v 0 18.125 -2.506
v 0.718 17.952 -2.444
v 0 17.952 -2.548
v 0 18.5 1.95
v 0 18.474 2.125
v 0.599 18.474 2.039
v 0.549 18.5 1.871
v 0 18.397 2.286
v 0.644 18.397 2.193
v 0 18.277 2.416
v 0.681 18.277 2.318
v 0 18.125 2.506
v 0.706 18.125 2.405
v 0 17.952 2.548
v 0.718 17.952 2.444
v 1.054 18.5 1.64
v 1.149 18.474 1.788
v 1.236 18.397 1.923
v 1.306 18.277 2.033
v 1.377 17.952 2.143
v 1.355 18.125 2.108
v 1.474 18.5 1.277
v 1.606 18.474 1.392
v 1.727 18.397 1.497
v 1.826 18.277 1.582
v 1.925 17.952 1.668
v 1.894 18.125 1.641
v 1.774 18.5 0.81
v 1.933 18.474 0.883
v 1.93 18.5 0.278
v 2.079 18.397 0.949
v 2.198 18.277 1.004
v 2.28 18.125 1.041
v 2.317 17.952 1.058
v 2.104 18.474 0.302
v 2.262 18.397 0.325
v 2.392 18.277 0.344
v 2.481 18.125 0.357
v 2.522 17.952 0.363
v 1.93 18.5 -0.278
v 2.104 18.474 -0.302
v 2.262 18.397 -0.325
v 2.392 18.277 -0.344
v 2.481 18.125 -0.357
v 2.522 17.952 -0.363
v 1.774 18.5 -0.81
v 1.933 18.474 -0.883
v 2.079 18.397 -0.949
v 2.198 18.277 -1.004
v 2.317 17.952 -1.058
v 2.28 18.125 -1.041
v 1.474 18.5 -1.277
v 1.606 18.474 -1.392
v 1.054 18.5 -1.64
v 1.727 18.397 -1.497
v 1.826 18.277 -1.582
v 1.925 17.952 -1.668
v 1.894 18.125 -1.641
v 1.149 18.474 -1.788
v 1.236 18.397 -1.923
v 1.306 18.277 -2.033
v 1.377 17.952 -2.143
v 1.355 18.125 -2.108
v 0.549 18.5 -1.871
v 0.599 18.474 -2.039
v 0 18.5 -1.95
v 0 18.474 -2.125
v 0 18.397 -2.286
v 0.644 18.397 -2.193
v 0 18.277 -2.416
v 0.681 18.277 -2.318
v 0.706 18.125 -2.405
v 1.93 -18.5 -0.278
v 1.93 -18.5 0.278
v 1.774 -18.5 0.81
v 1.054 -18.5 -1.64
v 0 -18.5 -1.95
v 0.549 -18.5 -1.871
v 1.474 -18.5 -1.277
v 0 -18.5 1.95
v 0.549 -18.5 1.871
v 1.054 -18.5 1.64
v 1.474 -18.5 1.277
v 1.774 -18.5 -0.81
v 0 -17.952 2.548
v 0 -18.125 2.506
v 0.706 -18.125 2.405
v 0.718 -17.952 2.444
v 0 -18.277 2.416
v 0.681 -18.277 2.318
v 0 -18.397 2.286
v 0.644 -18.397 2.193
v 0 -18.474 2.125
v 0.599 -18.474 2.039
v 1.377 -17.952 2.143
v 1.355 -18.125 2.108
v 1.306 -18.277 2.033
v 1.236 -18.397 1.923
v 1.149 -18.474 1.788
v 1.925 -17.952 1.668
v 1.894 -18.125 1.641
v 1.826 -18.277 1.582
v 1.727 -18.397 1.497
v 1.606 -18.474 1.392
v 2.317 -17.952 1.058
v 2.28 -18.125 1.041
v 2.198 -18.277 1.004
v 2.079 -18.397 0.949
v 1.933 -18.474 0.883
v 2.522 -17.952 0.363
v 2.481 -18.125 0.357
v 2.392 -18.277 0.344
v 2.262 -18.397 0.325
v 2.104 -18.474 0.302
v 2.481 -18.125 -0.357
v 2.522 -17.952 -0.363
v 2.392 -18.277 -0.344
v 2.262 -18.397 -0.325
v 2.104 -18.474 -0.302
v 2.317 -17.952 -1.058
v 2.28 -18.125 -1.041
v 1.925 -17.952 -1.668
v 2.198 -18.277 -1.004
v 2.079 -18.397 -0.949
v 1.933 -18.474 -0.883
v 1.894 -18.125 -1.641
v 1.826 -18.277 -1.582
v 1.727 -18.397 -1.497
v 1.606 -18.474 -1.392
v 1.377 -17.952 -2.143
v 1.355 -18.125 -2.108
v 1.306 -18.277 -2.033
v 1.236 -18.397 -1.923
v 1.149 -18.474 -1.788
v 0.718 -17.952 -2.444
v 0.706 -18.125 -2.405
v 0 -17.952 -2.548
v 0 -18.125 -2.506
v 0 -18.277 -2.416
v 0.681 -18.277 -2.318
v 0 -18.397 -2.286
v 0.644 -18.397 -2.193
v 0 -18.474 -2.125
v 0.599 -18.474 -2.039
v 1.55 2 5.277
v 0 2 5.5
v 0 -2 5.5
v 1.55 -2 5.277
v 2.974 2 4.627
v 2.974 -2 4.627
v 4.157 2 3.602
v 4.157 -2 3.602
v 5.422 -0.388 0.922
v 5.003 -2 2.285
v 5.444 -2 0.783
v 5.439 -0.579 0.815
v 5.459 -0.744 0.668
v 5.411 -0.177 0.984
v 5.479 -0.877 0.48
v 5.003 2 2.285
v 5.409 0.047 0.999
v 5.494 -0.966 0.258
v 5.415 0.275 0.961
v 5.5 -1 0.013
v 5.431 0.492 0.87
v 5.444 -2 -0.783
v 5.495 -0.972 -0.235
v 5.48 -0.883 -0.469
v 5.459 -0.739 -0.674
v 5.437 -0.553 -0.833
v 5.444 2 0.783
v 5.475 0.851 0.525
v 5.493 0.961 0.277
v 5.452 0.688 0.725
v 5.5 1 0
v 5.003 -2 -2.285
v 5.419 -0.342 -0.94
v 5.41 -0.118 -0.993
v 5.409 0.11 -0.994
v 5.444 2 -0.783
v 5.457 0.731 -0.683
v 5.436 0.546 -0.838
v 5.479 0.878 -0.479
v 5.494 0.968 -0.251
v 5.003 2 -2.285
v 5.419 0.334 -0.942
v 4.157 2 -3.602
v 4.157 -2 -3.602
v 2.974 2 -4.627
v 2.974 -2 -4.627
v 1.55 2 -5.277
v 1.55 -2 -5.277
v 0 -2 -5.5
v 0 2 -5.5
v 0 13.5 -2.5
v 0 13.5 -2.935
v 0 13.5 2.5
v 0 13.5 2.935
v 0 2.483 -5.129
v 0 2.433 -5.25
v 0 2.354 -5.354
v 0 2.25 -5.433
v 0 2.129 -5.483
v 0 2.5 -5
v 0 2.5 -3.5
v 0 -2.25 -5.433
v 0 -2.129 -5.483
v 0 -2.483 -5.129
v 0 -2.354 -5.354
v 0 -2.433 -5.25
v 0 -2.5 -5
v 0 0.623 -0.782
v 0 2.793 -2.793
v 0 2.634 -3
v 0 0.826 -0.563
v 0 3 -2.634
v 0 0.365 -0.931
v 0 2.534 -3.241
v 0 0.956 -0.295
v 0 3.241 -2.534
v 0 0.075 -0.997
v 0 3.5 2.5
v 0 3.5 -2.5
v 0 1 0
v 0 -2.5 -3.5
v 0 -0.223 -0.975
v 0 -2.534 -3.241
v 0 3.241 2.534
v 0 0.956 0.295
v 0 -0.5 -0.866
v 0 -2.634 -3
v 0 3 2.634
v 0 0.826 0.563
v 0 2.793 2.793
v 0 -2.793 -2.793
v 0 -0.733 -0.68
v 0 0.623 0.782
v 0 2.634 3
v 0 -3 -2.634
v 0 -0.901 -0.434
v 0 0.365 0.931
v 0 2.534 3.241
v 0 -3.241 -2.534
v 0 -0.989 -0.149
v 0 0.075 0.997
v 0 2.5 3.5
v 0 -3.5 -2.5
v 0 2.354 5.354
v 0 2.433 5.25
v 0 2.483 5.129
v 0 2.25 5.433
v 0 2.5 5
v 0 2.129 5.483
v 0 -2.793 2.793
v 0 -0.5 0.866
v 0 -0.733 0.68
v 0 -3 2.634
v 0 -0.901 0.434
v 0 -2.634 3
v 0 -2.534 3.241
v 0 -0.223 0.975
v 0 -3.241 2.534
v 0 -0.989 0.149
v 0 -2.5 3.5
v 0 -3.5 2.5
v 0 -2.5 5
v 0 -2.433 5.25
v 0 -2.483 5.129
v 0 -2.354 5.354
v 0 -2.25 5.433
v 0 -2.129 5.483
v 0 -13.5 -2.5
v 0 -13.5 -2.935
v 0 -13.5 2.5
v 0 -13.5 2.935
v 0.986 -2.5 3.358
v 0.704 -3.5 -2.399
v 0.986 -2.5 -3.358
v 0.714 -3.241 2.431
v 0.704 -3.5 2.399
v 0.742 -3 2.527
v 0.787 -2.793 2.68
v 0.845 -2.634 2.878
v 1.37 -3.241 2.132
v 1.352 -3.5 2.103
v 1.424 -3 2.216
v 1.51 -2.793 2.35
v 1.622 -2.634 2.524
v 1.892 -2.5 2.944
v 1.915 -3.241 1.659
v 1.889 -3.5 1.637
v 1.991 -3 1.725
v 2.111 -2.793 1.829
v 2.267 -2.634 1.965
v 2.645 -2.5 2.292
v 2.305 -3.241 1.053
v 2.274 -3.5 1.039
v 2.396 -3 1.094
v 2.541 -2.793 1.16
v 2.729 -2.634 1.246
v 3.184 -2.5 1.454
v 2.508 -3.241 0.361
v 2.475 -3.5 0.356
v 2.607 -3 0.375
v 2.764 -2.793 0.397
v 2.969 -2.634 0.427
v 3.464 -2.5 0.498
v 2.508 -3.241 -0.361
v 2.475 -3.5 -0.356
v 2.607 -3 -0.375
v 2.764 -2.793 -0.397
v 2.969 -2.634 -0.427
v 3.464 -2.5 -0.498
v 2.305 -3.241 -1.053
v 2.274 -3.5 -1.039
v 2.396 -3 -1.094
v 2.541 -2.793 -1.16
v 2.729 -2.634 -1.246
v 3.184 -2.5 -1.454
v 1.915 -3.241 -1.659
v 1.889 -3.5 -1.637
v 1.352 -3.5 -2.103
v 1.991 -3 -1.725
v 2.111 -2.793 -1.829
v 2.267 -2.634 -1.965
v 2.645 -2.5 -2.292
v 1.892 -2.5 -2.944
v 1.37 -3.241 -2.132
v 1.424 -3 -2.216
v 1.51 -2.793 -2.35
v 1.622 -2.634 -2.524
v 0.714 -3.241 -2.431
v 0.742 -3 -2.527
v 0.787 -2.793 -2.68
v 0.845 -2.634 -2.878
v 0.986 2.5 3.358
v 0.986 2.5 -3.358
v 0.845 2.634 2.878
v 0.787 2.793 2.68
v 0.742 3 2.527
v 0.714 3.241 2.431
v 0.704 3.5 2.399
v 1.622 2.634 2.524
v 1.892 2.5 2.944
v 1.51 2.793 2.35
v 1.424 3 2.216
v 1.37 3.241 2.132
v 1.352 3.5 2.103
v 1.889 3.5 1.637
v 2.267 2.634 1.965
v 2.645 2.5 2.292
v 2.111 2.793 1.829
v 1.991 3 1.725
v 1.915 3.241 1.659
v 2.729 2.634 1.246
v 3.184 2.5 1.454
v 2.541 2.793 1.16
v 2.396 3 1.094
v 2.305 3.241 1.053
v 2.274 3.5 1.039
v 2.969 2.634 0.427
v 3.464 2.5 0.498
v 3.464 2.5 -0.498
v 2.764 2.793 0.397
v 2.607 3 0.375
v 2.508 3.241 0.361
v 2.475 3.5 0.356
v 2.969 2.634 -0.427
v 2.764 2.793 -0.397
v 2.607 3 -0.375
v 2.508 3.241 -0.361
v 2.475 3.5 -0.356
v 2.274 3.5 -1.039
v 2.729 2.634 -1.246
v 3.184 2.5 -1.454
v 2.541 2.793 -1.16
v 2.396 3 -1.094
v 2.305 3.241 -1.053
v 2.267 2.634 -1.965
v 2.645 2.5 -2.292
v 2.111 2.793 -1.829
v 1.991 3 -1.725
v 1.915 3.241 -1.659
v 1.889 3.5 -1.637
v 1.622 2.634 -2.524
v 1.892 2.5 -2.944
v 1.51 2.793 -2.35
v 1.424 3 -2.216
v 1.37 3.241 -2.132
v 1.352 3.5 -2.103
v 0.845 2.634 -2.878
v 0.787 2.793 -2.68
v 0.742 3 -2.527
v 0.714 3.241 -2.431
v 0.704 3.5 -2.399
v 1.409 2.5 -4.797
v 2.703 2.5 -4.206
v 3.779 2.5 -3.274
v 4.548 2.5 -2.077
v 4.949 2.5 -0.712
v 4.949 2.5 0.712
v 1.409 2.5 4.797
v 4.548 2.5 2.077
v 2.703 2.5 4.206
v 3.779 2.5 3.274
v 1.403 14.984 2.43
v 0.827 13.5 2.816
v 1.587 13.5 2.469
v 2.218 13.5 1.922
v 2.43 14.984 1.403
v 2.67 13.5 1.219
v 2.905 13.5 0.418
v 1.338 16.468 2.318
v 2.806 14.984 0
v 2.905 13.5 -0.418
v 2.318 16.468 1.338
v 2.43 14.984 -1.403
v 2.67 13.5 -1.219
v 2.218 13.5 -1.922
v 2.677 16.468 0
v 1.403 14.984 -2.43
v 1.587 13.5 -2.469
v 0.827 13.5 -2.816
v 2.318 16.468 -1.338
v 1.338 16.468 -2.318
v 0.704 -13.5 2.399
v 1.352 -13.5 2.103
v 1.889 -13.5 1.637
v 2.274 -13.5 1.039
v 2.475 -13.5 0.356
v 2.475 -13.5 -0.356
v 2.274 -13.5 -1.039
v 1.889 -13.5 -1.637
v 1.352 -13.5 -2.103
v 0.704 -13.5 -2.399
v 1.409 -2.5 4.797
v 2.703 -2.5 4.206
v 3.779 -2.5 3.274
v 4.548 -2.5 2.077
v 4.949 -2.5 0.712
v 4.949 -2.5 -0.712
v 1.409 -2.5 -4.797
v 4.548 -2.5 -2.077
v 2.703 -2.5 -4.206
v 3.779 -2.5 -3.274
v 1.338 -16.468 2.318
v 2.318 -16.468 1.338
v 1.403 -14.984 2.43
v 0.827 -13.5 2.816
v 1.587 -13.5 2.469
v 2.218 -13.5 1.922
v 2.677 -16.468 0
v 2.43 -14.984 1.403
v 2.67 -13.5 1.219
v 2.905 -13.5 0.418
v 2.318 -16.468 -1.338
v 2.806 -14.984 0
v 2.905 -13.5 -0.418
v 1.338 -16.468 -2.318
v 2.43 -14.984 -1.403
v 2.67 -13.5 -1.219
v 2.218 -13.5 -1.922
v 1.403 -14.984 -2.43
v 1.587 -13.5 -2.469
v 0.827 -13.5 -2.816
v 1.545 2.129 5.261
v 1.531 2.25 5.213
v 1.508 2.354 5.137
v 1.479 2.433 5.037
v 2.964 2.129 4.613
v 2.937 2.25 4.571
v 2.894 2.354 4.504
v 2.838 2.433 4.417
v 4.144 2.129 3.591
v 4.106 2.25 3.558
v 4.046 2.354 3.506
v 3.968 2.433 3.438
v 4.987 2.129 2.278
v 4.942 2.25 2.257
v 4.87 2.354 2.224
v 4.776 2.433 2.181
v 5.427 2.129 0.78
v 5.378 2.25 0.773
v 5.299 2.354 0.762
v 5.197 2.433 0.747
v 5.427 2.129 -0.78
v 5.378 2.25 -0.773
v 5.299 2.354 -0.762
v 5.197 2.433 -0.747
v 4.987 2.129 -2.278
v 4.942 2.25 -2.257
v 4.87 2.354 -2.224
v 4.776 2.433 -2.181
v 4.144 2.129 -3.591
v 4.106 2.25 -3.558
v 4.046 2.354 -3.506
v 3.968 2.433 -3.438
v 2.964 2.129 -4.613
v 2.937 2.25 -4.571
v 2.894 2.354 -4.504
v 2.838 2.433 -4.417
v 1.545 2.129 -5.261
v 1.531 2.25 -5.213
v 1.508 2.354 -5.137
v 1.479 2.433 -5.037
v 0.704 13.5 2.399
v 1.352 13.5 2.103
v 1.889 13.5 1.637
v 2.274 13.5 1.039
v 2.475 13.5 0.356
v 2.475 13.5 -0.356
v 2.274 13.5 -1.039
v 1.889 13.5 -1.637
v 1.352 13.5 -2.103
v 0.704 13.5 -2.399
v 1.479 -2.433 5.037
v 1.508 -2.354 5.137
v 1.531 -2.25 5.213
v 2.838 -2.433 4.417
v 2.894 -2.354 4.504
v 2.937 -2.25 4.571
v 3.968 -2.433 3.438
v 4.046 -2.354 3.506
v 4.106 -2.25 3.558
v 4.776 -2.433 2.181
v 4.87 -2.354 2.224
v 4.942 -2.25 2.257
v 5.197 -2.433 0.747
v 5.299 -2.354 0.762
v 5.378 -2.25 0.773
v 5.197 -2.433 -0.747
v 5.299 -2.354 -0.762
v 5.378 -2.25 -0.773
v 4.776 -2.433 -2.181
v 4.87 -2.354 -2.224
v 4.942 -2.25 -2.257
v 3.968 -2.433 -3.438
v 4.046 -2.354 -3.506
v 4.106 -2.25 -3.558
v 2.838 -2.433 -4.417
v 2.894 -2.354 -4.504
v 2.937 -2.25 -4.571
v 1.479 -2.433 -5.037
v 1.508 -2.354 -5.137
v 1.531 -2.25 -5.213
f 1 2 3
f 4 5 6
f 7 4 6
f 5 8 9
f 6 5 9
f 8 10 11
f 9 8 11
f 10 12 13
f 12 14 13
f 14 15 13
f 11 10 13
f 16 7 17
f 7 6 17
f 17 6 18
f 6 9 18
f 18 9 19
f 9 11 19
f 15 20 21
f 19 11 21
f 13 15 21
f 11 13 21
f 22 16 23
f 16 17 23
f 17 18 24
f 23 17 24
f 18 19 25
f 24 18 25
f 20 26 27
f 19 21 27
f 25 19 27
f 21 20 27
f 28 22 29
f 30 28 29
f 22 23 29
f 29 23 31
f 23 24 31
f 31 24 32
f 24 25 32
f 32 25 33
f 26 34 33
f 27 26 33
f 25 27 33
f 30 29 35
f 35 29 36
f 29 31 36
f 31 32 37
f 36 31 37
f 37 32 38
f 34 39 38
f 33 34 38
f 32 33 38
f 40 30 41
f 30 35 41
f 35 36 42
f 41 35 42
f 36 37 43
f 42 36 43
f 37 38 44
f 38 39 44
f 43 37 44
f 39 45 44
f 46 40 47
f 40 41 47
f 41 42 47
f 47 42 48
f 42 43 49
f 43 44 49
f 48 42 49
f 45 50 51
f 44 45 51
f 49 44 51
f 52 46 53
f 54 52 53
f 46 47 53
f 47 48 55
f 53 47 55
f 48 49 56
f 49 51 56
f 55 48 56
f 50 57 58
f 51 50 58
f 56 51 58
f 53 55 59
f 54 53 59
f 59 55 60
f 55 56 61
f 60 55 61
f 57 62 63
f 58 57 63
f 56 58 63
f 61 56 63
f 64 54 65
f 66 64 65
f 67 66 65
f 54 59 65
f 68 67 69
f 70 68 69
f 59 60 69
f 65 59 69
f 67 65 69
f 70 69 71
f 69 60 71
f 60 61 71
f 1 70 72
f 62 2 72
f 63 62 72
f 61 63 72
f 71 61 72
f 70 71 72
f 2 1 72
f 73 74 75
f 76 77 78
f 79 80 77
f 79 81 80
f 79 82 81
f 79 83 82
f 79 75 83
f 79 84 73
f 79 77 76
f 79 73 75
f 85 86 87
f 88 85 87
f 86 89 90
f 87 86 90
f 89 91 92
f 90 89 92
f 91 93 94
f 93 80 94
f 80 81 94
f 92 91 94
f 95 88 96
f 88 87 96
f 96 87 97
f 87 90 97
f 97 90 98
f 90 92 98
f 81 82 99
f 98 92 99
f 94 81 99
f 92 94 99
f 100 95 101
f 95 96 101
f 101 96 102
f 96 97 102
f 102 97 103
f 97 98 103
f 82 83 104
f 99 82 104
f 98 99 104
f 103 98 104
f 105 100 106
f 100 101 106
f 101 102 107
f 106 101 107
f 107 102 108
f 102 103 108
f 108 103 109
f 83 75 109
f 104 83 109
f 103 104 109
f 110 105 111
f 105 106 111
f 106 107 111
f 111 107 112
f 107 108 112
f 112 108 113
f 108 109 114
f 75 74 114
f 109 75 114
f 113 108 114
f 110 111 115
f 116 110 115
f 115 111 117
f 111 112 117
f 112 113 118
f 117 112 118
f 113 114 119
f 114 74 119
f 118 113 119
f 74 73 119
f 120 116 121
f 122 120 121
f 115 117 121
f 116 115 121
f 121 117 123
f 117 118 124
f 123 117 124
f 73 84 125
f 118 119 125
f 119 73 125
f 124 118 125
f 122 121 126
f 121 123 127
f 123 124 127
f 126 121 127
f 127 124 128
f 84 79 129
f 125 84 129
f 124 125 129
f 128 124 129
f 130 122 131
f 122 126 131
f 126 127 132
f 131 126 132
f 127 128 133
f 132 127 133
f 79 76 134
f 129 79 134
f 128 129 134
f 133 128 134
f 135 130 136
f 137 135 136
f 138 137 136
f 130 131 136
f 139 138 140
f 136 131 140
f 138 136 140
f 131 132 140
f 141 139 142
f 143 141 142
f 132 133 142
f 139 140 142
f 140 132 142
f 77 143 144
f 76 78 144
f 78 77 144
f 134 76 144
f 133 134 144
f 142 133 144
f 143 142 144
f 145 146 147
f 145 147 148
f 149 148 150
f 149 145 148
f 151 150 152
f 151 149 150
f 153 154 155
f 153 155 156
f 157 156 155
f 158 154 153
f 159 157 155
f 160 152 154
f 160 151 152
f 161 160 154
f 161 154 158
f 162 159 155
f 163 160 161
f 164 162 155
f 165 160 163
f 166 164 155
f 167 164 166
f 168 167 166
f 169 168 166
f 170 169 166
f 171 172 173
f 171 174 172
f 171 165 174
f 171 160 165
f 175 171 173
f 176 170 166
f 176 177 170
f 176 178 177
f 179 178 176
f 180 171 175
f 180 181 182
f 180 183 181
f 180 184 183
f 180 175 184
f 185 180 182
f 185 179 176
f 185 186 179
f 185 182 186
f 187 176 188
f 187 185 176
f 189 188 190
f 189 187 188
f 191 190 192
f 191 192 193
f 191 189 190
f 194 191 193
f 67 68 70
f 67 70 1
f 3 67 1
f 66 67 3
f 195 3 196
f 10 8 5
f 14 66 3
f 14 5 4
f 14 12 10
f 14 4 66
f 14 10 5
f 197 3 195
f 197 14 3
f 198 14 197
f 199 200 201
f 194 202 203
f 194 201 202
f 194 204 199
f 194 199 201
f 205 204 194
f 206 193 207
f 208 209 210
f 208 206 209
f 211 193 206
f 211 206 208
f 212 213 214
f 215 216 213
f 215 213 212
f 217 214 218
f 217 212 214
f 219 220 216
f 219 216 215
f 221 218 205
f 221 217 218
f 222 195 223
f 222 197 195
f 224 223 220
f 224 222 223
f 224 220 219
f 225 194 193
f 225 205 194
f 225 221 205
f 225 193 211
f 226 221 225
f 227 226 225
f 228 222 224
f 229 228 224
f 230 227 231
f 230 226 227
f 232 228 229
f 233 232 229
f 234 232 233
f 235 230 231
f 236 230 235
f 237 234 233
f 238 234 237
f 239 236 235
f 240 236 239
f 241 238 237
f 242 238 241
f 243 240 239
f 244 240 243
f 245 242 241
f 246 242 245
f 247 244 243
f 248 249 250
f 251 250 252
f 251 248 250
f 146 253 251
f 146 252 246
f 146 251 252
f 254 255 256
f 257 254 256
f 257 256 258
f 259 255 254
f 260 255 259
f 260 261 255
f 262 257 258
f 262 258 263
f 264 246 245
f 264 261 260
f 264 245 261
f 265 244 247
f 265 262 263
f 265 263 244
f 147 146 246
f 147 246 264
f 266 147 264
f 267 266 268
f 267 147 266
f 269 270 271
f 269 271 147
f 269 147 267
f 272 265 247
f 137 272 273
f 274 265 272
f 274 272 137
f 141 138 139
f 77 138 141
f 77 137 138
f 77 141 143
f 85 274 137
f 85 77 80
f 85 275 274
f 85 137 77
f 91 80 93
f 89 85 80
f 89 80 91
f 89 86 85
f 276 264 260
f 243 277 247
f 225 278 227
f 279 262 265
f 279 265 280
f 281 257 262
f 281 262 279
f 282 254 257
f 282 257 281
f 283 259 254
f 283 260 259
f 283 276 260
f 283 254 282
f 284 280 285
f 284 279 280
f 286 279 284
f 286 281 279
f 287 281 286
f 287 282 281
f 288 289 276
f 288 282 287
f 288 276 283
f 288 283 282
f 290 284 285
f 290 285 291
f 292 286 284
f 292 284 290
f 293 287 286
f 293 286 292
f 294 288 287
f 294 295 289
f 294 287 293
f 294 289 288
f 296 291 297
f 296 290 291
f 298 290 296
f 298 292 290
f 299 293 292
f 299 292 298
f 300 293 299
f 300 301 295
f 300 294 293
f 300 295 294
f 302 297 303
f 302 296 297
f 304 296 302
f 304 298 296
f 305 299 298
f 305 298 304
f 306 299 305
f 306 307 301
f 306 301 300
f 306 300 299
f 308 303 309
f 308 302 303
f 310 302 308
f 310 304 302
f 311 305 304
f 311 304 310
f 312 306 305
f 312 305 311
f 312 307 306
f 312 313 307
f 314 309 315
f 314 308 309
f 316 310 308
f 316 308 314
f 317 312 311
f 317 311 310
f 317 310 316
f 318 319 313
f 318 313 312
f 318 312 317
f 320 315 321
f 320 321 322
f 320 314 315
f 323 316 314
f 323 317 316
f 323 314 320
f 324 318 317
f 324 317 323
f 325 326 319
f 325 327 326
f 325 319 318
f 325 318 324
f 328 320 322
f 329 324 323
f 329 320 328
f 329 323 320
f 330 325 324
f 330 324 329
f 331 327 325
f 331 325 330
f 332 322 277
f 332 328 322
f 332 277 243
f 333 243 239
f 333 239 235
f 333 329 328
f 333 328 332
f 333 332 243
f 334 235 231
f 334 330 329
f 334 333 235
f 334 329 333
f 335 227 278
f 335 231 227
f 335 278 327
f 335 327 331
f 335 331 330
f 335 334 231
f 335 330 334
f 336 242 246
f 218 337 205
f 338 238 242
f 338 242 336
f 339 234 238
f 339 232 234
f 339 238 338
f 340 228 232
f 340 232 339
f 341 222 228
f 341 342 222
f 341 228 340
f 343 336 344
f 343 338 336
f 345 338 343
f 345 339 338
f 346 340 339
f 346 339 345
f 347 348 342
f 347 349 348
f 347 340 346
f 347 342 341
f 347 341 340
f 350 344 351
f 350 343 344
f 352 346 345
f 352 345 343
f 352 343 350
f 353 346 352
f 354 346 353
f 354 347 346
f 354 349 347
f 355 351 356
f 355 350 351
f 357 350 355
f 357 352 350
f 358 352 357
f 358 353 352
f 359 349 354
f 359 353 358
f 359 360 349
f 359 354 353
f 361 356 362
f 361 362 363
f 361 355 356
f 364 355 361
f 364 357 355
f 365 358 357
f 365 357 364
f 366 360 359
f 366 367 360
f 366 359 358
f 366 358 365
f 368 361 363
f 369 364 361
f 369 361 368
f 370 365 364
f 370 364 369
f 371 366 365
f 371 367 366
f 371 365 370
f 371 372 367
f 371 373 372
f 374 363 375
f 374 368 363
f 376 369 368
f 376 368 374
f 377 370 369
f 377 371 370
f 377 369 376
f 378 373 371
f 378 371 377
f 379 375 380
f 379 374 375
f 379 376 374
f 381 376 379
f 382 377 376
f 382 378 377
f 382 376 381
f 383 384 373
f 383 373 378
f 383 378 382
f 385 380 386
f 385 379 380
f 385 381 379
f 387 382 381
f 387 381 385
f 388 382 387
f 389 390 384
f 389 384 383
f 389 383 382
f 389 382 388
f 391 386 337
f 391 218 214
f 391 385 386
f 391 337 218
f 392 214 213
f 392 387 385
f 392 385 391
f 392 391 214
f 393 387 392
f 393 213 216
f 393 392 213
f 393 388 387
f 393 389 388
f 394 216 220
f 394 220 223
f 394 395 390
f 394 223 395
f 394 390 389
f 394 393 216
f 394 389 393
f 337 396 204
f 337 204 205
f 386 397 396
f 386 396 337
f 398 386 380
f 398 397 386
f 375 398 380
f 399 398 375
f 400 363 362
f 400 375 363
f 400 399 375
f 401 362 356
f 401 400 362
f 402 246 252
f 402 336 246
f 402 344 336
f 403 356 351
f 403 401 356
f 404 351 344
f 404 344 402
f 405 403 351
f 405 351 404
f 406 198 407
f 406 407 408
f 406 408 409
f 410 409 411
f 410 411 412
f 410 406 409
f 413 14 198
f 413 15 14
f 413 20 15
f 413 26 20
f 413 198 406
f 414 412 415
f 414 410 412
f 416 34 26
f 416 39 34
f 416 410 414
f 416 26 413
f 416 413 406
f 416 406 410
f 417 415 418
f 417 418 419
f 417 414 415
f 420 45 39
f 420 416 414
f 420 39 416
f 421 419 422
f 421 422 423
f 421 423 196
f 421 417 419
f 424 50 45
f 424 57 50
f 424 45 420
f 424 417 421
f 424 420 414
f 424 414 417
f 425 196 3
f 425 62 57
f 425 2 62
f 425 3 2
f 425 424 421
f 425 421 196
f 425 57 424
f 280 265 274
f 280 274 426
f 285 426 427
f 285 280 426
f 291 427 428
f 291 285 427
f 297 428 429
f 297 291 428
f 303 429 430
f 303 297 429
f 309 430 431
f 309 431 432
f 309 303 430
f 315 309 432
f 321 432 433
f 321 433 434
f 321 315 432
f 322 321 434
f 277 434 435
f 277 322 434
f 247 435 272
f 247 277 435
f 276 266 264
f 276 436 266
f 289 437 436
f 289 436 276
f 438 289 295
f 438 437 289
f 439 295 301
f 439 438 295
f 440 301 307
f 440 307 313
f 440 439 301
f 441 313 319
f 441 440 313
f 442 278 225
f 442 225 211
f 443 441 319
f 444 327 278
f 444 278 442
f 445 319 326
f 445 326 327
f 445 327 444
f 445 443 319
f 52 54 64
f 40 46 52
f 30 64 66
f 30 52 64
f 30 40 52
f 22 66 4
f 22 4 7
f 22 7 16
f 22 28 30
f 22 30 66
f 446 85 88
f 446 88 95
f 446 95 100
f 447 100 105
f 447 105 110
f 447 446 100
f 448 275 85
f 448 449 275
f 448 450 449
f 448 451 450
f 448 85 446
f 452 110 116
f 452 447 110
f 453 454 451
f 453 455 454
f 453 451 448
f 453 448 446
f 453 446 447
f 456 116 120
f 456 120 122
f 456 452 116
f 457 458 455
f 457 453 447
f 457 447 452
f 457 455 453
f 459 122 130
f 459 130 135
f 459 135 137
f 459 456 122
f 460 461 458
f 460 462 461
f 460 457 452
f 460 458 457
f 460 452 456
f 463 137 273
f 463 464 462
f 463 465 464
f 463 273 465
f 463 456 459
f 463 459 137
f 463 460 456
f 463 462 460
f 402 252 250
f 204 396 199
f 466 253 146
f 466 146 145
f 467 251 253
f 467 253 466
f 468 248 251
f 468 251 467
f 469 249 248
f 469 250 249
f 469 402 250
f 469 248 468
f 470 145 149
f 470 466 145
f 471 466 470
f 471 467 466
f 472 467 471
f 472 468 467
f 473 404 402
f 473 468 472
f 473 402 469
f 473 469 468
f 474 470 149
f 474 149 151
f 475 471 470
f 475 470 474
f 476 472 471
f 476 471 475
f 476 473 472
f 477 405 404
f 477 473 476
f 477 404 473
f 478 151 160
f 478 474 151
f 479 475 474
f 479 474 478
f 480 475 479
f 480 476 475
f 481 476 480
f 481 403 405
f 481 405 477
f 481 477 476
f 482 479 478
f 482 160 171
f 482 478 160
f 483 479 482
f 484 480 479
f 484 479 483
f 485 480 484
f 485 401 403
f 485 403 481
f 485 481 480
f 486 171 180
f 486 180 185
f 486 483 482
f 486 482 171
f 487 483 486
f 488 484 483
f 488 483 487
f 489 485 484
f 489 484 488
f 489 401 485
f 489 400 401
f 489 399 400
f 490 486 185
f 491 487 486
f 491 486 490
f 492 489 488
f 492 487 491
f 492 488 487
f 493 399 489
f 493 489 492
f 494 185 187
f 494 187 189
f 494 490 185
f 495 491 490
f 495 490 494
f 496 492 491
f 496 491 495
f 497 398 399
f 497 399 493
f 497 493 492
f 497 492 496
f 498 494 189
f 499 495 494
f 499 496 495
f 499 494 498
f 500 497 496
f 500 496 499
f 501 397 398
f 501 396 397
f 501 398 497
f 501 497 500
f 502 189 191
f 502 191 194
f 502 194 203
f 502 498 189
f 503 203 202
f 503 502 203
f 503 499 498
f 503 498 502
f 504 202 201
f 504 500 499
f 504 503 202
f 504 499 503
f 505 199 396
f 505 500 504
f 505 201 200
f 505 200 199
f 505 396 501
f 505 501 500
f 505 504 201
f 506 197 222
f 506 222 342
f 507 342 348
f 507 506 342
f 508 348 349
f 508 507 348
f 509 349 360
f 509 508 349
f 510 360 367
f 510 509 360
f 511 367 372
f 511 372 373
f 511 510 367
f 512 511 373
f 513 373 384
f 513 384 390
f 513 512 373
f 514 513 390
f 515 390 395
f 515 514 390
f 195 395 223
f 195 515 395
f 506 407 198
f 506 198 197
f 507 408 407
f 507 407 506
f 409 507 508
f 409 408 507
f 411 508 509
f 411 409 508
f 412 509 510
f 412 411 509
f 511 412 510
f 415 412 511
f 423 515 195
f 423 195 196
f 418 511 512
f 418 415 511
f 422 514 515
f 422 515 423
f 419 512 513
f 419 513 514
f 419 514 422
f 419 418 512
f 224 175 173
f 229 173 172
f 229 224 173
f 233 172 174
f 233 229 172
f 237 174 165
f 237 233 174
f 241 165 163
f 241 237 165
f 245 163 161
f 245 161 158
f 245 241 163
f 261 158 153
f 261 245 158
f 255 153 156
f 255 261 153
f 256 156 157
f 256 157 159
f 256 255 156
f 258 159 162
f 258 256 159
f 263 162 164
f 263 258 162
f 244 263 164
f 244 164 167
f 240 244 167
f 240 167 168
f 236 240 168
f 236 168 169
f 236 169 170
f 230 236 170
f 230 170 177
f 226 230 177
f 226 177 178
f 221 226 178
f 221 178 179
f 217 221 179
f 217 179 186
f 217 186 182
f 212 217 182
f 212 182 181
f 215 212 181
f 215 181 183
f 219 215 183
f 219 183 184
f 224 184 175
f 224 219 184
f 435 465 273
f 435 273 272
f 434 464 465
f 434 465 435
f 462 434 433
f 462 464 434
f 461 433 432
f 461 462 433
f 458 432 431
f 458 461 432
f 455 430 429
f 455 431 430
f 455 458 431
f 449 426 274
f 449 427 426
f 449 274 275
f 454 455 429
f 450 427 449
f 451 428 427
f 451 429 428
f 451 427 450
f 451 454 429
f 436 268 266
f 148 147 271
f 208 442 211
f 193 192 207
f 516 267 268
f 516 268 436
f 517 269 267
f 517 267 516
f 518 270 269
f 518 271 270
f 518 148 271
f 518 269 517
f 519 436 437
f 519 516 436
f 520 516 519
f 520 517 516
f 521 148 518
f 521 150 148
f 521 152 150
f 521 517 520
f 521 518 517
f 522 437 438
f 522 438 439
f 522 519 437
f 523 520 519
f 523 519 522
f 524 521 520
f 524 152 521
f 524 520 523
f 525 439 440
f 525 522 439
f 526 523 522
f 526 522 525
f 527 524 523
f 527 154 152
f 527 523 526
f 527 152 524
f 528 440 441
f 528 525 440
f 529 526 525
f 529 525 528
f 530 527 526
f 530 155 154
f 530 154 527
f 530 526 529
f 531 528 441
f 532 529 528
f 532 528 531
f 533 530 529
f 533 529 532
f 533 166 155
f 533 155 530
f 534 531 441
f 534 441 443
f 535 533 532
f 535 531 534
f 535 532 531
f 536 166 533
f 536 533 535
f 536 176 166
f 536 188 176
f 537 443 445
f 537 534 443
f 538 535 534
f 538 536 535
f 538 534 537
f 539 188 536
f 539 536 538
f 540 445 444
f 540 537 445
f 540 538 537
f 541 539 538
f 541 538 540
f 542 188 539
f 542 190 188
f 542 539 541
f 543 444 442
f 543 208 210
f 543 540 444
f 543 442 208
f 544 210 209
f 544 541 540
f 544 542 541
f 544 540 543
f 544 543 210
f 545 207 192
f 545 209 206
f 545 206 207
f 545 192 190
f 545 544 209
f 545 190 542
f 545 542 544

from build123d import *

# Parameters (mm, degrees)
REVOLUTION002_ANGLE  = 180
FILLET006_R          = 0.6
FILLET007_R          = 1
FILLET008_R          = 0.5
SKETCH003_R          = 1
POCKET001_DEPTH      = 0.001
POCKET001_DEPTH_BACK = 5.501


with BuildPart() as part:
    # Sketch004 → Revolution002 (revolve)
    with BuildSketch(Plane.YZ):
        Polygon((-18.5, 2.5), (-13.5, 2.935), (-13.5, 2.5), (-2.5, 2.5), (-2.5, 5.5), (2.5, 5.5), (2.5, 2.5), (13.5, 2.5), (13.5, 2.935), (18.5, 2.5), (18.5, 0), (-18.5, 0), align=None)
    revolve(axis=Axis((0, 0, 0), (0, 1, 0)), revolution_arc=REVOLUTION002_ANGLE)

    # Fillet006
    fillet006_edges = [part.edges().sort_by_distance(p)[0] for p in [
        (2.5, -18.5, 0),
        (2.5, 18.5, 0),
    ]]
    fillet(fillet006_edges, radius=FILLET006_R)

    # Fillet007
    fillet007_edges = [part.edges().sort_by_distance(p)[0] for p in [
        (2.5, -2.5, 0),
        (2.5, 2.5, 0),
    ]]
    fillet(fillet007_edges, radius=FILLET007_R)

    # Fillet008
    fillet008_edges = [part.edges().sort_by_distance(p)[0] for p in [
        (5.5, -2.5, 0),
        (5.5, 2.5, 0),
    ]]
    fillet(fillet008_edges, radius=FILLET008_R)

    # Sketch003 → Pocket001 (cut, two sides)
    with BuildSketch(Plane.YZ) as pocket001_sk:
        Circle(SKETCH003_R)
    extrude(amount=-POCKET001_DEPTH, mode=Mode.SUBTRACT)
    extrude(pocket001_sk.sketch, amount=POCKET001_DEPTH_BACK, mode=Mode.SUBTRACT)


solid = part.part
